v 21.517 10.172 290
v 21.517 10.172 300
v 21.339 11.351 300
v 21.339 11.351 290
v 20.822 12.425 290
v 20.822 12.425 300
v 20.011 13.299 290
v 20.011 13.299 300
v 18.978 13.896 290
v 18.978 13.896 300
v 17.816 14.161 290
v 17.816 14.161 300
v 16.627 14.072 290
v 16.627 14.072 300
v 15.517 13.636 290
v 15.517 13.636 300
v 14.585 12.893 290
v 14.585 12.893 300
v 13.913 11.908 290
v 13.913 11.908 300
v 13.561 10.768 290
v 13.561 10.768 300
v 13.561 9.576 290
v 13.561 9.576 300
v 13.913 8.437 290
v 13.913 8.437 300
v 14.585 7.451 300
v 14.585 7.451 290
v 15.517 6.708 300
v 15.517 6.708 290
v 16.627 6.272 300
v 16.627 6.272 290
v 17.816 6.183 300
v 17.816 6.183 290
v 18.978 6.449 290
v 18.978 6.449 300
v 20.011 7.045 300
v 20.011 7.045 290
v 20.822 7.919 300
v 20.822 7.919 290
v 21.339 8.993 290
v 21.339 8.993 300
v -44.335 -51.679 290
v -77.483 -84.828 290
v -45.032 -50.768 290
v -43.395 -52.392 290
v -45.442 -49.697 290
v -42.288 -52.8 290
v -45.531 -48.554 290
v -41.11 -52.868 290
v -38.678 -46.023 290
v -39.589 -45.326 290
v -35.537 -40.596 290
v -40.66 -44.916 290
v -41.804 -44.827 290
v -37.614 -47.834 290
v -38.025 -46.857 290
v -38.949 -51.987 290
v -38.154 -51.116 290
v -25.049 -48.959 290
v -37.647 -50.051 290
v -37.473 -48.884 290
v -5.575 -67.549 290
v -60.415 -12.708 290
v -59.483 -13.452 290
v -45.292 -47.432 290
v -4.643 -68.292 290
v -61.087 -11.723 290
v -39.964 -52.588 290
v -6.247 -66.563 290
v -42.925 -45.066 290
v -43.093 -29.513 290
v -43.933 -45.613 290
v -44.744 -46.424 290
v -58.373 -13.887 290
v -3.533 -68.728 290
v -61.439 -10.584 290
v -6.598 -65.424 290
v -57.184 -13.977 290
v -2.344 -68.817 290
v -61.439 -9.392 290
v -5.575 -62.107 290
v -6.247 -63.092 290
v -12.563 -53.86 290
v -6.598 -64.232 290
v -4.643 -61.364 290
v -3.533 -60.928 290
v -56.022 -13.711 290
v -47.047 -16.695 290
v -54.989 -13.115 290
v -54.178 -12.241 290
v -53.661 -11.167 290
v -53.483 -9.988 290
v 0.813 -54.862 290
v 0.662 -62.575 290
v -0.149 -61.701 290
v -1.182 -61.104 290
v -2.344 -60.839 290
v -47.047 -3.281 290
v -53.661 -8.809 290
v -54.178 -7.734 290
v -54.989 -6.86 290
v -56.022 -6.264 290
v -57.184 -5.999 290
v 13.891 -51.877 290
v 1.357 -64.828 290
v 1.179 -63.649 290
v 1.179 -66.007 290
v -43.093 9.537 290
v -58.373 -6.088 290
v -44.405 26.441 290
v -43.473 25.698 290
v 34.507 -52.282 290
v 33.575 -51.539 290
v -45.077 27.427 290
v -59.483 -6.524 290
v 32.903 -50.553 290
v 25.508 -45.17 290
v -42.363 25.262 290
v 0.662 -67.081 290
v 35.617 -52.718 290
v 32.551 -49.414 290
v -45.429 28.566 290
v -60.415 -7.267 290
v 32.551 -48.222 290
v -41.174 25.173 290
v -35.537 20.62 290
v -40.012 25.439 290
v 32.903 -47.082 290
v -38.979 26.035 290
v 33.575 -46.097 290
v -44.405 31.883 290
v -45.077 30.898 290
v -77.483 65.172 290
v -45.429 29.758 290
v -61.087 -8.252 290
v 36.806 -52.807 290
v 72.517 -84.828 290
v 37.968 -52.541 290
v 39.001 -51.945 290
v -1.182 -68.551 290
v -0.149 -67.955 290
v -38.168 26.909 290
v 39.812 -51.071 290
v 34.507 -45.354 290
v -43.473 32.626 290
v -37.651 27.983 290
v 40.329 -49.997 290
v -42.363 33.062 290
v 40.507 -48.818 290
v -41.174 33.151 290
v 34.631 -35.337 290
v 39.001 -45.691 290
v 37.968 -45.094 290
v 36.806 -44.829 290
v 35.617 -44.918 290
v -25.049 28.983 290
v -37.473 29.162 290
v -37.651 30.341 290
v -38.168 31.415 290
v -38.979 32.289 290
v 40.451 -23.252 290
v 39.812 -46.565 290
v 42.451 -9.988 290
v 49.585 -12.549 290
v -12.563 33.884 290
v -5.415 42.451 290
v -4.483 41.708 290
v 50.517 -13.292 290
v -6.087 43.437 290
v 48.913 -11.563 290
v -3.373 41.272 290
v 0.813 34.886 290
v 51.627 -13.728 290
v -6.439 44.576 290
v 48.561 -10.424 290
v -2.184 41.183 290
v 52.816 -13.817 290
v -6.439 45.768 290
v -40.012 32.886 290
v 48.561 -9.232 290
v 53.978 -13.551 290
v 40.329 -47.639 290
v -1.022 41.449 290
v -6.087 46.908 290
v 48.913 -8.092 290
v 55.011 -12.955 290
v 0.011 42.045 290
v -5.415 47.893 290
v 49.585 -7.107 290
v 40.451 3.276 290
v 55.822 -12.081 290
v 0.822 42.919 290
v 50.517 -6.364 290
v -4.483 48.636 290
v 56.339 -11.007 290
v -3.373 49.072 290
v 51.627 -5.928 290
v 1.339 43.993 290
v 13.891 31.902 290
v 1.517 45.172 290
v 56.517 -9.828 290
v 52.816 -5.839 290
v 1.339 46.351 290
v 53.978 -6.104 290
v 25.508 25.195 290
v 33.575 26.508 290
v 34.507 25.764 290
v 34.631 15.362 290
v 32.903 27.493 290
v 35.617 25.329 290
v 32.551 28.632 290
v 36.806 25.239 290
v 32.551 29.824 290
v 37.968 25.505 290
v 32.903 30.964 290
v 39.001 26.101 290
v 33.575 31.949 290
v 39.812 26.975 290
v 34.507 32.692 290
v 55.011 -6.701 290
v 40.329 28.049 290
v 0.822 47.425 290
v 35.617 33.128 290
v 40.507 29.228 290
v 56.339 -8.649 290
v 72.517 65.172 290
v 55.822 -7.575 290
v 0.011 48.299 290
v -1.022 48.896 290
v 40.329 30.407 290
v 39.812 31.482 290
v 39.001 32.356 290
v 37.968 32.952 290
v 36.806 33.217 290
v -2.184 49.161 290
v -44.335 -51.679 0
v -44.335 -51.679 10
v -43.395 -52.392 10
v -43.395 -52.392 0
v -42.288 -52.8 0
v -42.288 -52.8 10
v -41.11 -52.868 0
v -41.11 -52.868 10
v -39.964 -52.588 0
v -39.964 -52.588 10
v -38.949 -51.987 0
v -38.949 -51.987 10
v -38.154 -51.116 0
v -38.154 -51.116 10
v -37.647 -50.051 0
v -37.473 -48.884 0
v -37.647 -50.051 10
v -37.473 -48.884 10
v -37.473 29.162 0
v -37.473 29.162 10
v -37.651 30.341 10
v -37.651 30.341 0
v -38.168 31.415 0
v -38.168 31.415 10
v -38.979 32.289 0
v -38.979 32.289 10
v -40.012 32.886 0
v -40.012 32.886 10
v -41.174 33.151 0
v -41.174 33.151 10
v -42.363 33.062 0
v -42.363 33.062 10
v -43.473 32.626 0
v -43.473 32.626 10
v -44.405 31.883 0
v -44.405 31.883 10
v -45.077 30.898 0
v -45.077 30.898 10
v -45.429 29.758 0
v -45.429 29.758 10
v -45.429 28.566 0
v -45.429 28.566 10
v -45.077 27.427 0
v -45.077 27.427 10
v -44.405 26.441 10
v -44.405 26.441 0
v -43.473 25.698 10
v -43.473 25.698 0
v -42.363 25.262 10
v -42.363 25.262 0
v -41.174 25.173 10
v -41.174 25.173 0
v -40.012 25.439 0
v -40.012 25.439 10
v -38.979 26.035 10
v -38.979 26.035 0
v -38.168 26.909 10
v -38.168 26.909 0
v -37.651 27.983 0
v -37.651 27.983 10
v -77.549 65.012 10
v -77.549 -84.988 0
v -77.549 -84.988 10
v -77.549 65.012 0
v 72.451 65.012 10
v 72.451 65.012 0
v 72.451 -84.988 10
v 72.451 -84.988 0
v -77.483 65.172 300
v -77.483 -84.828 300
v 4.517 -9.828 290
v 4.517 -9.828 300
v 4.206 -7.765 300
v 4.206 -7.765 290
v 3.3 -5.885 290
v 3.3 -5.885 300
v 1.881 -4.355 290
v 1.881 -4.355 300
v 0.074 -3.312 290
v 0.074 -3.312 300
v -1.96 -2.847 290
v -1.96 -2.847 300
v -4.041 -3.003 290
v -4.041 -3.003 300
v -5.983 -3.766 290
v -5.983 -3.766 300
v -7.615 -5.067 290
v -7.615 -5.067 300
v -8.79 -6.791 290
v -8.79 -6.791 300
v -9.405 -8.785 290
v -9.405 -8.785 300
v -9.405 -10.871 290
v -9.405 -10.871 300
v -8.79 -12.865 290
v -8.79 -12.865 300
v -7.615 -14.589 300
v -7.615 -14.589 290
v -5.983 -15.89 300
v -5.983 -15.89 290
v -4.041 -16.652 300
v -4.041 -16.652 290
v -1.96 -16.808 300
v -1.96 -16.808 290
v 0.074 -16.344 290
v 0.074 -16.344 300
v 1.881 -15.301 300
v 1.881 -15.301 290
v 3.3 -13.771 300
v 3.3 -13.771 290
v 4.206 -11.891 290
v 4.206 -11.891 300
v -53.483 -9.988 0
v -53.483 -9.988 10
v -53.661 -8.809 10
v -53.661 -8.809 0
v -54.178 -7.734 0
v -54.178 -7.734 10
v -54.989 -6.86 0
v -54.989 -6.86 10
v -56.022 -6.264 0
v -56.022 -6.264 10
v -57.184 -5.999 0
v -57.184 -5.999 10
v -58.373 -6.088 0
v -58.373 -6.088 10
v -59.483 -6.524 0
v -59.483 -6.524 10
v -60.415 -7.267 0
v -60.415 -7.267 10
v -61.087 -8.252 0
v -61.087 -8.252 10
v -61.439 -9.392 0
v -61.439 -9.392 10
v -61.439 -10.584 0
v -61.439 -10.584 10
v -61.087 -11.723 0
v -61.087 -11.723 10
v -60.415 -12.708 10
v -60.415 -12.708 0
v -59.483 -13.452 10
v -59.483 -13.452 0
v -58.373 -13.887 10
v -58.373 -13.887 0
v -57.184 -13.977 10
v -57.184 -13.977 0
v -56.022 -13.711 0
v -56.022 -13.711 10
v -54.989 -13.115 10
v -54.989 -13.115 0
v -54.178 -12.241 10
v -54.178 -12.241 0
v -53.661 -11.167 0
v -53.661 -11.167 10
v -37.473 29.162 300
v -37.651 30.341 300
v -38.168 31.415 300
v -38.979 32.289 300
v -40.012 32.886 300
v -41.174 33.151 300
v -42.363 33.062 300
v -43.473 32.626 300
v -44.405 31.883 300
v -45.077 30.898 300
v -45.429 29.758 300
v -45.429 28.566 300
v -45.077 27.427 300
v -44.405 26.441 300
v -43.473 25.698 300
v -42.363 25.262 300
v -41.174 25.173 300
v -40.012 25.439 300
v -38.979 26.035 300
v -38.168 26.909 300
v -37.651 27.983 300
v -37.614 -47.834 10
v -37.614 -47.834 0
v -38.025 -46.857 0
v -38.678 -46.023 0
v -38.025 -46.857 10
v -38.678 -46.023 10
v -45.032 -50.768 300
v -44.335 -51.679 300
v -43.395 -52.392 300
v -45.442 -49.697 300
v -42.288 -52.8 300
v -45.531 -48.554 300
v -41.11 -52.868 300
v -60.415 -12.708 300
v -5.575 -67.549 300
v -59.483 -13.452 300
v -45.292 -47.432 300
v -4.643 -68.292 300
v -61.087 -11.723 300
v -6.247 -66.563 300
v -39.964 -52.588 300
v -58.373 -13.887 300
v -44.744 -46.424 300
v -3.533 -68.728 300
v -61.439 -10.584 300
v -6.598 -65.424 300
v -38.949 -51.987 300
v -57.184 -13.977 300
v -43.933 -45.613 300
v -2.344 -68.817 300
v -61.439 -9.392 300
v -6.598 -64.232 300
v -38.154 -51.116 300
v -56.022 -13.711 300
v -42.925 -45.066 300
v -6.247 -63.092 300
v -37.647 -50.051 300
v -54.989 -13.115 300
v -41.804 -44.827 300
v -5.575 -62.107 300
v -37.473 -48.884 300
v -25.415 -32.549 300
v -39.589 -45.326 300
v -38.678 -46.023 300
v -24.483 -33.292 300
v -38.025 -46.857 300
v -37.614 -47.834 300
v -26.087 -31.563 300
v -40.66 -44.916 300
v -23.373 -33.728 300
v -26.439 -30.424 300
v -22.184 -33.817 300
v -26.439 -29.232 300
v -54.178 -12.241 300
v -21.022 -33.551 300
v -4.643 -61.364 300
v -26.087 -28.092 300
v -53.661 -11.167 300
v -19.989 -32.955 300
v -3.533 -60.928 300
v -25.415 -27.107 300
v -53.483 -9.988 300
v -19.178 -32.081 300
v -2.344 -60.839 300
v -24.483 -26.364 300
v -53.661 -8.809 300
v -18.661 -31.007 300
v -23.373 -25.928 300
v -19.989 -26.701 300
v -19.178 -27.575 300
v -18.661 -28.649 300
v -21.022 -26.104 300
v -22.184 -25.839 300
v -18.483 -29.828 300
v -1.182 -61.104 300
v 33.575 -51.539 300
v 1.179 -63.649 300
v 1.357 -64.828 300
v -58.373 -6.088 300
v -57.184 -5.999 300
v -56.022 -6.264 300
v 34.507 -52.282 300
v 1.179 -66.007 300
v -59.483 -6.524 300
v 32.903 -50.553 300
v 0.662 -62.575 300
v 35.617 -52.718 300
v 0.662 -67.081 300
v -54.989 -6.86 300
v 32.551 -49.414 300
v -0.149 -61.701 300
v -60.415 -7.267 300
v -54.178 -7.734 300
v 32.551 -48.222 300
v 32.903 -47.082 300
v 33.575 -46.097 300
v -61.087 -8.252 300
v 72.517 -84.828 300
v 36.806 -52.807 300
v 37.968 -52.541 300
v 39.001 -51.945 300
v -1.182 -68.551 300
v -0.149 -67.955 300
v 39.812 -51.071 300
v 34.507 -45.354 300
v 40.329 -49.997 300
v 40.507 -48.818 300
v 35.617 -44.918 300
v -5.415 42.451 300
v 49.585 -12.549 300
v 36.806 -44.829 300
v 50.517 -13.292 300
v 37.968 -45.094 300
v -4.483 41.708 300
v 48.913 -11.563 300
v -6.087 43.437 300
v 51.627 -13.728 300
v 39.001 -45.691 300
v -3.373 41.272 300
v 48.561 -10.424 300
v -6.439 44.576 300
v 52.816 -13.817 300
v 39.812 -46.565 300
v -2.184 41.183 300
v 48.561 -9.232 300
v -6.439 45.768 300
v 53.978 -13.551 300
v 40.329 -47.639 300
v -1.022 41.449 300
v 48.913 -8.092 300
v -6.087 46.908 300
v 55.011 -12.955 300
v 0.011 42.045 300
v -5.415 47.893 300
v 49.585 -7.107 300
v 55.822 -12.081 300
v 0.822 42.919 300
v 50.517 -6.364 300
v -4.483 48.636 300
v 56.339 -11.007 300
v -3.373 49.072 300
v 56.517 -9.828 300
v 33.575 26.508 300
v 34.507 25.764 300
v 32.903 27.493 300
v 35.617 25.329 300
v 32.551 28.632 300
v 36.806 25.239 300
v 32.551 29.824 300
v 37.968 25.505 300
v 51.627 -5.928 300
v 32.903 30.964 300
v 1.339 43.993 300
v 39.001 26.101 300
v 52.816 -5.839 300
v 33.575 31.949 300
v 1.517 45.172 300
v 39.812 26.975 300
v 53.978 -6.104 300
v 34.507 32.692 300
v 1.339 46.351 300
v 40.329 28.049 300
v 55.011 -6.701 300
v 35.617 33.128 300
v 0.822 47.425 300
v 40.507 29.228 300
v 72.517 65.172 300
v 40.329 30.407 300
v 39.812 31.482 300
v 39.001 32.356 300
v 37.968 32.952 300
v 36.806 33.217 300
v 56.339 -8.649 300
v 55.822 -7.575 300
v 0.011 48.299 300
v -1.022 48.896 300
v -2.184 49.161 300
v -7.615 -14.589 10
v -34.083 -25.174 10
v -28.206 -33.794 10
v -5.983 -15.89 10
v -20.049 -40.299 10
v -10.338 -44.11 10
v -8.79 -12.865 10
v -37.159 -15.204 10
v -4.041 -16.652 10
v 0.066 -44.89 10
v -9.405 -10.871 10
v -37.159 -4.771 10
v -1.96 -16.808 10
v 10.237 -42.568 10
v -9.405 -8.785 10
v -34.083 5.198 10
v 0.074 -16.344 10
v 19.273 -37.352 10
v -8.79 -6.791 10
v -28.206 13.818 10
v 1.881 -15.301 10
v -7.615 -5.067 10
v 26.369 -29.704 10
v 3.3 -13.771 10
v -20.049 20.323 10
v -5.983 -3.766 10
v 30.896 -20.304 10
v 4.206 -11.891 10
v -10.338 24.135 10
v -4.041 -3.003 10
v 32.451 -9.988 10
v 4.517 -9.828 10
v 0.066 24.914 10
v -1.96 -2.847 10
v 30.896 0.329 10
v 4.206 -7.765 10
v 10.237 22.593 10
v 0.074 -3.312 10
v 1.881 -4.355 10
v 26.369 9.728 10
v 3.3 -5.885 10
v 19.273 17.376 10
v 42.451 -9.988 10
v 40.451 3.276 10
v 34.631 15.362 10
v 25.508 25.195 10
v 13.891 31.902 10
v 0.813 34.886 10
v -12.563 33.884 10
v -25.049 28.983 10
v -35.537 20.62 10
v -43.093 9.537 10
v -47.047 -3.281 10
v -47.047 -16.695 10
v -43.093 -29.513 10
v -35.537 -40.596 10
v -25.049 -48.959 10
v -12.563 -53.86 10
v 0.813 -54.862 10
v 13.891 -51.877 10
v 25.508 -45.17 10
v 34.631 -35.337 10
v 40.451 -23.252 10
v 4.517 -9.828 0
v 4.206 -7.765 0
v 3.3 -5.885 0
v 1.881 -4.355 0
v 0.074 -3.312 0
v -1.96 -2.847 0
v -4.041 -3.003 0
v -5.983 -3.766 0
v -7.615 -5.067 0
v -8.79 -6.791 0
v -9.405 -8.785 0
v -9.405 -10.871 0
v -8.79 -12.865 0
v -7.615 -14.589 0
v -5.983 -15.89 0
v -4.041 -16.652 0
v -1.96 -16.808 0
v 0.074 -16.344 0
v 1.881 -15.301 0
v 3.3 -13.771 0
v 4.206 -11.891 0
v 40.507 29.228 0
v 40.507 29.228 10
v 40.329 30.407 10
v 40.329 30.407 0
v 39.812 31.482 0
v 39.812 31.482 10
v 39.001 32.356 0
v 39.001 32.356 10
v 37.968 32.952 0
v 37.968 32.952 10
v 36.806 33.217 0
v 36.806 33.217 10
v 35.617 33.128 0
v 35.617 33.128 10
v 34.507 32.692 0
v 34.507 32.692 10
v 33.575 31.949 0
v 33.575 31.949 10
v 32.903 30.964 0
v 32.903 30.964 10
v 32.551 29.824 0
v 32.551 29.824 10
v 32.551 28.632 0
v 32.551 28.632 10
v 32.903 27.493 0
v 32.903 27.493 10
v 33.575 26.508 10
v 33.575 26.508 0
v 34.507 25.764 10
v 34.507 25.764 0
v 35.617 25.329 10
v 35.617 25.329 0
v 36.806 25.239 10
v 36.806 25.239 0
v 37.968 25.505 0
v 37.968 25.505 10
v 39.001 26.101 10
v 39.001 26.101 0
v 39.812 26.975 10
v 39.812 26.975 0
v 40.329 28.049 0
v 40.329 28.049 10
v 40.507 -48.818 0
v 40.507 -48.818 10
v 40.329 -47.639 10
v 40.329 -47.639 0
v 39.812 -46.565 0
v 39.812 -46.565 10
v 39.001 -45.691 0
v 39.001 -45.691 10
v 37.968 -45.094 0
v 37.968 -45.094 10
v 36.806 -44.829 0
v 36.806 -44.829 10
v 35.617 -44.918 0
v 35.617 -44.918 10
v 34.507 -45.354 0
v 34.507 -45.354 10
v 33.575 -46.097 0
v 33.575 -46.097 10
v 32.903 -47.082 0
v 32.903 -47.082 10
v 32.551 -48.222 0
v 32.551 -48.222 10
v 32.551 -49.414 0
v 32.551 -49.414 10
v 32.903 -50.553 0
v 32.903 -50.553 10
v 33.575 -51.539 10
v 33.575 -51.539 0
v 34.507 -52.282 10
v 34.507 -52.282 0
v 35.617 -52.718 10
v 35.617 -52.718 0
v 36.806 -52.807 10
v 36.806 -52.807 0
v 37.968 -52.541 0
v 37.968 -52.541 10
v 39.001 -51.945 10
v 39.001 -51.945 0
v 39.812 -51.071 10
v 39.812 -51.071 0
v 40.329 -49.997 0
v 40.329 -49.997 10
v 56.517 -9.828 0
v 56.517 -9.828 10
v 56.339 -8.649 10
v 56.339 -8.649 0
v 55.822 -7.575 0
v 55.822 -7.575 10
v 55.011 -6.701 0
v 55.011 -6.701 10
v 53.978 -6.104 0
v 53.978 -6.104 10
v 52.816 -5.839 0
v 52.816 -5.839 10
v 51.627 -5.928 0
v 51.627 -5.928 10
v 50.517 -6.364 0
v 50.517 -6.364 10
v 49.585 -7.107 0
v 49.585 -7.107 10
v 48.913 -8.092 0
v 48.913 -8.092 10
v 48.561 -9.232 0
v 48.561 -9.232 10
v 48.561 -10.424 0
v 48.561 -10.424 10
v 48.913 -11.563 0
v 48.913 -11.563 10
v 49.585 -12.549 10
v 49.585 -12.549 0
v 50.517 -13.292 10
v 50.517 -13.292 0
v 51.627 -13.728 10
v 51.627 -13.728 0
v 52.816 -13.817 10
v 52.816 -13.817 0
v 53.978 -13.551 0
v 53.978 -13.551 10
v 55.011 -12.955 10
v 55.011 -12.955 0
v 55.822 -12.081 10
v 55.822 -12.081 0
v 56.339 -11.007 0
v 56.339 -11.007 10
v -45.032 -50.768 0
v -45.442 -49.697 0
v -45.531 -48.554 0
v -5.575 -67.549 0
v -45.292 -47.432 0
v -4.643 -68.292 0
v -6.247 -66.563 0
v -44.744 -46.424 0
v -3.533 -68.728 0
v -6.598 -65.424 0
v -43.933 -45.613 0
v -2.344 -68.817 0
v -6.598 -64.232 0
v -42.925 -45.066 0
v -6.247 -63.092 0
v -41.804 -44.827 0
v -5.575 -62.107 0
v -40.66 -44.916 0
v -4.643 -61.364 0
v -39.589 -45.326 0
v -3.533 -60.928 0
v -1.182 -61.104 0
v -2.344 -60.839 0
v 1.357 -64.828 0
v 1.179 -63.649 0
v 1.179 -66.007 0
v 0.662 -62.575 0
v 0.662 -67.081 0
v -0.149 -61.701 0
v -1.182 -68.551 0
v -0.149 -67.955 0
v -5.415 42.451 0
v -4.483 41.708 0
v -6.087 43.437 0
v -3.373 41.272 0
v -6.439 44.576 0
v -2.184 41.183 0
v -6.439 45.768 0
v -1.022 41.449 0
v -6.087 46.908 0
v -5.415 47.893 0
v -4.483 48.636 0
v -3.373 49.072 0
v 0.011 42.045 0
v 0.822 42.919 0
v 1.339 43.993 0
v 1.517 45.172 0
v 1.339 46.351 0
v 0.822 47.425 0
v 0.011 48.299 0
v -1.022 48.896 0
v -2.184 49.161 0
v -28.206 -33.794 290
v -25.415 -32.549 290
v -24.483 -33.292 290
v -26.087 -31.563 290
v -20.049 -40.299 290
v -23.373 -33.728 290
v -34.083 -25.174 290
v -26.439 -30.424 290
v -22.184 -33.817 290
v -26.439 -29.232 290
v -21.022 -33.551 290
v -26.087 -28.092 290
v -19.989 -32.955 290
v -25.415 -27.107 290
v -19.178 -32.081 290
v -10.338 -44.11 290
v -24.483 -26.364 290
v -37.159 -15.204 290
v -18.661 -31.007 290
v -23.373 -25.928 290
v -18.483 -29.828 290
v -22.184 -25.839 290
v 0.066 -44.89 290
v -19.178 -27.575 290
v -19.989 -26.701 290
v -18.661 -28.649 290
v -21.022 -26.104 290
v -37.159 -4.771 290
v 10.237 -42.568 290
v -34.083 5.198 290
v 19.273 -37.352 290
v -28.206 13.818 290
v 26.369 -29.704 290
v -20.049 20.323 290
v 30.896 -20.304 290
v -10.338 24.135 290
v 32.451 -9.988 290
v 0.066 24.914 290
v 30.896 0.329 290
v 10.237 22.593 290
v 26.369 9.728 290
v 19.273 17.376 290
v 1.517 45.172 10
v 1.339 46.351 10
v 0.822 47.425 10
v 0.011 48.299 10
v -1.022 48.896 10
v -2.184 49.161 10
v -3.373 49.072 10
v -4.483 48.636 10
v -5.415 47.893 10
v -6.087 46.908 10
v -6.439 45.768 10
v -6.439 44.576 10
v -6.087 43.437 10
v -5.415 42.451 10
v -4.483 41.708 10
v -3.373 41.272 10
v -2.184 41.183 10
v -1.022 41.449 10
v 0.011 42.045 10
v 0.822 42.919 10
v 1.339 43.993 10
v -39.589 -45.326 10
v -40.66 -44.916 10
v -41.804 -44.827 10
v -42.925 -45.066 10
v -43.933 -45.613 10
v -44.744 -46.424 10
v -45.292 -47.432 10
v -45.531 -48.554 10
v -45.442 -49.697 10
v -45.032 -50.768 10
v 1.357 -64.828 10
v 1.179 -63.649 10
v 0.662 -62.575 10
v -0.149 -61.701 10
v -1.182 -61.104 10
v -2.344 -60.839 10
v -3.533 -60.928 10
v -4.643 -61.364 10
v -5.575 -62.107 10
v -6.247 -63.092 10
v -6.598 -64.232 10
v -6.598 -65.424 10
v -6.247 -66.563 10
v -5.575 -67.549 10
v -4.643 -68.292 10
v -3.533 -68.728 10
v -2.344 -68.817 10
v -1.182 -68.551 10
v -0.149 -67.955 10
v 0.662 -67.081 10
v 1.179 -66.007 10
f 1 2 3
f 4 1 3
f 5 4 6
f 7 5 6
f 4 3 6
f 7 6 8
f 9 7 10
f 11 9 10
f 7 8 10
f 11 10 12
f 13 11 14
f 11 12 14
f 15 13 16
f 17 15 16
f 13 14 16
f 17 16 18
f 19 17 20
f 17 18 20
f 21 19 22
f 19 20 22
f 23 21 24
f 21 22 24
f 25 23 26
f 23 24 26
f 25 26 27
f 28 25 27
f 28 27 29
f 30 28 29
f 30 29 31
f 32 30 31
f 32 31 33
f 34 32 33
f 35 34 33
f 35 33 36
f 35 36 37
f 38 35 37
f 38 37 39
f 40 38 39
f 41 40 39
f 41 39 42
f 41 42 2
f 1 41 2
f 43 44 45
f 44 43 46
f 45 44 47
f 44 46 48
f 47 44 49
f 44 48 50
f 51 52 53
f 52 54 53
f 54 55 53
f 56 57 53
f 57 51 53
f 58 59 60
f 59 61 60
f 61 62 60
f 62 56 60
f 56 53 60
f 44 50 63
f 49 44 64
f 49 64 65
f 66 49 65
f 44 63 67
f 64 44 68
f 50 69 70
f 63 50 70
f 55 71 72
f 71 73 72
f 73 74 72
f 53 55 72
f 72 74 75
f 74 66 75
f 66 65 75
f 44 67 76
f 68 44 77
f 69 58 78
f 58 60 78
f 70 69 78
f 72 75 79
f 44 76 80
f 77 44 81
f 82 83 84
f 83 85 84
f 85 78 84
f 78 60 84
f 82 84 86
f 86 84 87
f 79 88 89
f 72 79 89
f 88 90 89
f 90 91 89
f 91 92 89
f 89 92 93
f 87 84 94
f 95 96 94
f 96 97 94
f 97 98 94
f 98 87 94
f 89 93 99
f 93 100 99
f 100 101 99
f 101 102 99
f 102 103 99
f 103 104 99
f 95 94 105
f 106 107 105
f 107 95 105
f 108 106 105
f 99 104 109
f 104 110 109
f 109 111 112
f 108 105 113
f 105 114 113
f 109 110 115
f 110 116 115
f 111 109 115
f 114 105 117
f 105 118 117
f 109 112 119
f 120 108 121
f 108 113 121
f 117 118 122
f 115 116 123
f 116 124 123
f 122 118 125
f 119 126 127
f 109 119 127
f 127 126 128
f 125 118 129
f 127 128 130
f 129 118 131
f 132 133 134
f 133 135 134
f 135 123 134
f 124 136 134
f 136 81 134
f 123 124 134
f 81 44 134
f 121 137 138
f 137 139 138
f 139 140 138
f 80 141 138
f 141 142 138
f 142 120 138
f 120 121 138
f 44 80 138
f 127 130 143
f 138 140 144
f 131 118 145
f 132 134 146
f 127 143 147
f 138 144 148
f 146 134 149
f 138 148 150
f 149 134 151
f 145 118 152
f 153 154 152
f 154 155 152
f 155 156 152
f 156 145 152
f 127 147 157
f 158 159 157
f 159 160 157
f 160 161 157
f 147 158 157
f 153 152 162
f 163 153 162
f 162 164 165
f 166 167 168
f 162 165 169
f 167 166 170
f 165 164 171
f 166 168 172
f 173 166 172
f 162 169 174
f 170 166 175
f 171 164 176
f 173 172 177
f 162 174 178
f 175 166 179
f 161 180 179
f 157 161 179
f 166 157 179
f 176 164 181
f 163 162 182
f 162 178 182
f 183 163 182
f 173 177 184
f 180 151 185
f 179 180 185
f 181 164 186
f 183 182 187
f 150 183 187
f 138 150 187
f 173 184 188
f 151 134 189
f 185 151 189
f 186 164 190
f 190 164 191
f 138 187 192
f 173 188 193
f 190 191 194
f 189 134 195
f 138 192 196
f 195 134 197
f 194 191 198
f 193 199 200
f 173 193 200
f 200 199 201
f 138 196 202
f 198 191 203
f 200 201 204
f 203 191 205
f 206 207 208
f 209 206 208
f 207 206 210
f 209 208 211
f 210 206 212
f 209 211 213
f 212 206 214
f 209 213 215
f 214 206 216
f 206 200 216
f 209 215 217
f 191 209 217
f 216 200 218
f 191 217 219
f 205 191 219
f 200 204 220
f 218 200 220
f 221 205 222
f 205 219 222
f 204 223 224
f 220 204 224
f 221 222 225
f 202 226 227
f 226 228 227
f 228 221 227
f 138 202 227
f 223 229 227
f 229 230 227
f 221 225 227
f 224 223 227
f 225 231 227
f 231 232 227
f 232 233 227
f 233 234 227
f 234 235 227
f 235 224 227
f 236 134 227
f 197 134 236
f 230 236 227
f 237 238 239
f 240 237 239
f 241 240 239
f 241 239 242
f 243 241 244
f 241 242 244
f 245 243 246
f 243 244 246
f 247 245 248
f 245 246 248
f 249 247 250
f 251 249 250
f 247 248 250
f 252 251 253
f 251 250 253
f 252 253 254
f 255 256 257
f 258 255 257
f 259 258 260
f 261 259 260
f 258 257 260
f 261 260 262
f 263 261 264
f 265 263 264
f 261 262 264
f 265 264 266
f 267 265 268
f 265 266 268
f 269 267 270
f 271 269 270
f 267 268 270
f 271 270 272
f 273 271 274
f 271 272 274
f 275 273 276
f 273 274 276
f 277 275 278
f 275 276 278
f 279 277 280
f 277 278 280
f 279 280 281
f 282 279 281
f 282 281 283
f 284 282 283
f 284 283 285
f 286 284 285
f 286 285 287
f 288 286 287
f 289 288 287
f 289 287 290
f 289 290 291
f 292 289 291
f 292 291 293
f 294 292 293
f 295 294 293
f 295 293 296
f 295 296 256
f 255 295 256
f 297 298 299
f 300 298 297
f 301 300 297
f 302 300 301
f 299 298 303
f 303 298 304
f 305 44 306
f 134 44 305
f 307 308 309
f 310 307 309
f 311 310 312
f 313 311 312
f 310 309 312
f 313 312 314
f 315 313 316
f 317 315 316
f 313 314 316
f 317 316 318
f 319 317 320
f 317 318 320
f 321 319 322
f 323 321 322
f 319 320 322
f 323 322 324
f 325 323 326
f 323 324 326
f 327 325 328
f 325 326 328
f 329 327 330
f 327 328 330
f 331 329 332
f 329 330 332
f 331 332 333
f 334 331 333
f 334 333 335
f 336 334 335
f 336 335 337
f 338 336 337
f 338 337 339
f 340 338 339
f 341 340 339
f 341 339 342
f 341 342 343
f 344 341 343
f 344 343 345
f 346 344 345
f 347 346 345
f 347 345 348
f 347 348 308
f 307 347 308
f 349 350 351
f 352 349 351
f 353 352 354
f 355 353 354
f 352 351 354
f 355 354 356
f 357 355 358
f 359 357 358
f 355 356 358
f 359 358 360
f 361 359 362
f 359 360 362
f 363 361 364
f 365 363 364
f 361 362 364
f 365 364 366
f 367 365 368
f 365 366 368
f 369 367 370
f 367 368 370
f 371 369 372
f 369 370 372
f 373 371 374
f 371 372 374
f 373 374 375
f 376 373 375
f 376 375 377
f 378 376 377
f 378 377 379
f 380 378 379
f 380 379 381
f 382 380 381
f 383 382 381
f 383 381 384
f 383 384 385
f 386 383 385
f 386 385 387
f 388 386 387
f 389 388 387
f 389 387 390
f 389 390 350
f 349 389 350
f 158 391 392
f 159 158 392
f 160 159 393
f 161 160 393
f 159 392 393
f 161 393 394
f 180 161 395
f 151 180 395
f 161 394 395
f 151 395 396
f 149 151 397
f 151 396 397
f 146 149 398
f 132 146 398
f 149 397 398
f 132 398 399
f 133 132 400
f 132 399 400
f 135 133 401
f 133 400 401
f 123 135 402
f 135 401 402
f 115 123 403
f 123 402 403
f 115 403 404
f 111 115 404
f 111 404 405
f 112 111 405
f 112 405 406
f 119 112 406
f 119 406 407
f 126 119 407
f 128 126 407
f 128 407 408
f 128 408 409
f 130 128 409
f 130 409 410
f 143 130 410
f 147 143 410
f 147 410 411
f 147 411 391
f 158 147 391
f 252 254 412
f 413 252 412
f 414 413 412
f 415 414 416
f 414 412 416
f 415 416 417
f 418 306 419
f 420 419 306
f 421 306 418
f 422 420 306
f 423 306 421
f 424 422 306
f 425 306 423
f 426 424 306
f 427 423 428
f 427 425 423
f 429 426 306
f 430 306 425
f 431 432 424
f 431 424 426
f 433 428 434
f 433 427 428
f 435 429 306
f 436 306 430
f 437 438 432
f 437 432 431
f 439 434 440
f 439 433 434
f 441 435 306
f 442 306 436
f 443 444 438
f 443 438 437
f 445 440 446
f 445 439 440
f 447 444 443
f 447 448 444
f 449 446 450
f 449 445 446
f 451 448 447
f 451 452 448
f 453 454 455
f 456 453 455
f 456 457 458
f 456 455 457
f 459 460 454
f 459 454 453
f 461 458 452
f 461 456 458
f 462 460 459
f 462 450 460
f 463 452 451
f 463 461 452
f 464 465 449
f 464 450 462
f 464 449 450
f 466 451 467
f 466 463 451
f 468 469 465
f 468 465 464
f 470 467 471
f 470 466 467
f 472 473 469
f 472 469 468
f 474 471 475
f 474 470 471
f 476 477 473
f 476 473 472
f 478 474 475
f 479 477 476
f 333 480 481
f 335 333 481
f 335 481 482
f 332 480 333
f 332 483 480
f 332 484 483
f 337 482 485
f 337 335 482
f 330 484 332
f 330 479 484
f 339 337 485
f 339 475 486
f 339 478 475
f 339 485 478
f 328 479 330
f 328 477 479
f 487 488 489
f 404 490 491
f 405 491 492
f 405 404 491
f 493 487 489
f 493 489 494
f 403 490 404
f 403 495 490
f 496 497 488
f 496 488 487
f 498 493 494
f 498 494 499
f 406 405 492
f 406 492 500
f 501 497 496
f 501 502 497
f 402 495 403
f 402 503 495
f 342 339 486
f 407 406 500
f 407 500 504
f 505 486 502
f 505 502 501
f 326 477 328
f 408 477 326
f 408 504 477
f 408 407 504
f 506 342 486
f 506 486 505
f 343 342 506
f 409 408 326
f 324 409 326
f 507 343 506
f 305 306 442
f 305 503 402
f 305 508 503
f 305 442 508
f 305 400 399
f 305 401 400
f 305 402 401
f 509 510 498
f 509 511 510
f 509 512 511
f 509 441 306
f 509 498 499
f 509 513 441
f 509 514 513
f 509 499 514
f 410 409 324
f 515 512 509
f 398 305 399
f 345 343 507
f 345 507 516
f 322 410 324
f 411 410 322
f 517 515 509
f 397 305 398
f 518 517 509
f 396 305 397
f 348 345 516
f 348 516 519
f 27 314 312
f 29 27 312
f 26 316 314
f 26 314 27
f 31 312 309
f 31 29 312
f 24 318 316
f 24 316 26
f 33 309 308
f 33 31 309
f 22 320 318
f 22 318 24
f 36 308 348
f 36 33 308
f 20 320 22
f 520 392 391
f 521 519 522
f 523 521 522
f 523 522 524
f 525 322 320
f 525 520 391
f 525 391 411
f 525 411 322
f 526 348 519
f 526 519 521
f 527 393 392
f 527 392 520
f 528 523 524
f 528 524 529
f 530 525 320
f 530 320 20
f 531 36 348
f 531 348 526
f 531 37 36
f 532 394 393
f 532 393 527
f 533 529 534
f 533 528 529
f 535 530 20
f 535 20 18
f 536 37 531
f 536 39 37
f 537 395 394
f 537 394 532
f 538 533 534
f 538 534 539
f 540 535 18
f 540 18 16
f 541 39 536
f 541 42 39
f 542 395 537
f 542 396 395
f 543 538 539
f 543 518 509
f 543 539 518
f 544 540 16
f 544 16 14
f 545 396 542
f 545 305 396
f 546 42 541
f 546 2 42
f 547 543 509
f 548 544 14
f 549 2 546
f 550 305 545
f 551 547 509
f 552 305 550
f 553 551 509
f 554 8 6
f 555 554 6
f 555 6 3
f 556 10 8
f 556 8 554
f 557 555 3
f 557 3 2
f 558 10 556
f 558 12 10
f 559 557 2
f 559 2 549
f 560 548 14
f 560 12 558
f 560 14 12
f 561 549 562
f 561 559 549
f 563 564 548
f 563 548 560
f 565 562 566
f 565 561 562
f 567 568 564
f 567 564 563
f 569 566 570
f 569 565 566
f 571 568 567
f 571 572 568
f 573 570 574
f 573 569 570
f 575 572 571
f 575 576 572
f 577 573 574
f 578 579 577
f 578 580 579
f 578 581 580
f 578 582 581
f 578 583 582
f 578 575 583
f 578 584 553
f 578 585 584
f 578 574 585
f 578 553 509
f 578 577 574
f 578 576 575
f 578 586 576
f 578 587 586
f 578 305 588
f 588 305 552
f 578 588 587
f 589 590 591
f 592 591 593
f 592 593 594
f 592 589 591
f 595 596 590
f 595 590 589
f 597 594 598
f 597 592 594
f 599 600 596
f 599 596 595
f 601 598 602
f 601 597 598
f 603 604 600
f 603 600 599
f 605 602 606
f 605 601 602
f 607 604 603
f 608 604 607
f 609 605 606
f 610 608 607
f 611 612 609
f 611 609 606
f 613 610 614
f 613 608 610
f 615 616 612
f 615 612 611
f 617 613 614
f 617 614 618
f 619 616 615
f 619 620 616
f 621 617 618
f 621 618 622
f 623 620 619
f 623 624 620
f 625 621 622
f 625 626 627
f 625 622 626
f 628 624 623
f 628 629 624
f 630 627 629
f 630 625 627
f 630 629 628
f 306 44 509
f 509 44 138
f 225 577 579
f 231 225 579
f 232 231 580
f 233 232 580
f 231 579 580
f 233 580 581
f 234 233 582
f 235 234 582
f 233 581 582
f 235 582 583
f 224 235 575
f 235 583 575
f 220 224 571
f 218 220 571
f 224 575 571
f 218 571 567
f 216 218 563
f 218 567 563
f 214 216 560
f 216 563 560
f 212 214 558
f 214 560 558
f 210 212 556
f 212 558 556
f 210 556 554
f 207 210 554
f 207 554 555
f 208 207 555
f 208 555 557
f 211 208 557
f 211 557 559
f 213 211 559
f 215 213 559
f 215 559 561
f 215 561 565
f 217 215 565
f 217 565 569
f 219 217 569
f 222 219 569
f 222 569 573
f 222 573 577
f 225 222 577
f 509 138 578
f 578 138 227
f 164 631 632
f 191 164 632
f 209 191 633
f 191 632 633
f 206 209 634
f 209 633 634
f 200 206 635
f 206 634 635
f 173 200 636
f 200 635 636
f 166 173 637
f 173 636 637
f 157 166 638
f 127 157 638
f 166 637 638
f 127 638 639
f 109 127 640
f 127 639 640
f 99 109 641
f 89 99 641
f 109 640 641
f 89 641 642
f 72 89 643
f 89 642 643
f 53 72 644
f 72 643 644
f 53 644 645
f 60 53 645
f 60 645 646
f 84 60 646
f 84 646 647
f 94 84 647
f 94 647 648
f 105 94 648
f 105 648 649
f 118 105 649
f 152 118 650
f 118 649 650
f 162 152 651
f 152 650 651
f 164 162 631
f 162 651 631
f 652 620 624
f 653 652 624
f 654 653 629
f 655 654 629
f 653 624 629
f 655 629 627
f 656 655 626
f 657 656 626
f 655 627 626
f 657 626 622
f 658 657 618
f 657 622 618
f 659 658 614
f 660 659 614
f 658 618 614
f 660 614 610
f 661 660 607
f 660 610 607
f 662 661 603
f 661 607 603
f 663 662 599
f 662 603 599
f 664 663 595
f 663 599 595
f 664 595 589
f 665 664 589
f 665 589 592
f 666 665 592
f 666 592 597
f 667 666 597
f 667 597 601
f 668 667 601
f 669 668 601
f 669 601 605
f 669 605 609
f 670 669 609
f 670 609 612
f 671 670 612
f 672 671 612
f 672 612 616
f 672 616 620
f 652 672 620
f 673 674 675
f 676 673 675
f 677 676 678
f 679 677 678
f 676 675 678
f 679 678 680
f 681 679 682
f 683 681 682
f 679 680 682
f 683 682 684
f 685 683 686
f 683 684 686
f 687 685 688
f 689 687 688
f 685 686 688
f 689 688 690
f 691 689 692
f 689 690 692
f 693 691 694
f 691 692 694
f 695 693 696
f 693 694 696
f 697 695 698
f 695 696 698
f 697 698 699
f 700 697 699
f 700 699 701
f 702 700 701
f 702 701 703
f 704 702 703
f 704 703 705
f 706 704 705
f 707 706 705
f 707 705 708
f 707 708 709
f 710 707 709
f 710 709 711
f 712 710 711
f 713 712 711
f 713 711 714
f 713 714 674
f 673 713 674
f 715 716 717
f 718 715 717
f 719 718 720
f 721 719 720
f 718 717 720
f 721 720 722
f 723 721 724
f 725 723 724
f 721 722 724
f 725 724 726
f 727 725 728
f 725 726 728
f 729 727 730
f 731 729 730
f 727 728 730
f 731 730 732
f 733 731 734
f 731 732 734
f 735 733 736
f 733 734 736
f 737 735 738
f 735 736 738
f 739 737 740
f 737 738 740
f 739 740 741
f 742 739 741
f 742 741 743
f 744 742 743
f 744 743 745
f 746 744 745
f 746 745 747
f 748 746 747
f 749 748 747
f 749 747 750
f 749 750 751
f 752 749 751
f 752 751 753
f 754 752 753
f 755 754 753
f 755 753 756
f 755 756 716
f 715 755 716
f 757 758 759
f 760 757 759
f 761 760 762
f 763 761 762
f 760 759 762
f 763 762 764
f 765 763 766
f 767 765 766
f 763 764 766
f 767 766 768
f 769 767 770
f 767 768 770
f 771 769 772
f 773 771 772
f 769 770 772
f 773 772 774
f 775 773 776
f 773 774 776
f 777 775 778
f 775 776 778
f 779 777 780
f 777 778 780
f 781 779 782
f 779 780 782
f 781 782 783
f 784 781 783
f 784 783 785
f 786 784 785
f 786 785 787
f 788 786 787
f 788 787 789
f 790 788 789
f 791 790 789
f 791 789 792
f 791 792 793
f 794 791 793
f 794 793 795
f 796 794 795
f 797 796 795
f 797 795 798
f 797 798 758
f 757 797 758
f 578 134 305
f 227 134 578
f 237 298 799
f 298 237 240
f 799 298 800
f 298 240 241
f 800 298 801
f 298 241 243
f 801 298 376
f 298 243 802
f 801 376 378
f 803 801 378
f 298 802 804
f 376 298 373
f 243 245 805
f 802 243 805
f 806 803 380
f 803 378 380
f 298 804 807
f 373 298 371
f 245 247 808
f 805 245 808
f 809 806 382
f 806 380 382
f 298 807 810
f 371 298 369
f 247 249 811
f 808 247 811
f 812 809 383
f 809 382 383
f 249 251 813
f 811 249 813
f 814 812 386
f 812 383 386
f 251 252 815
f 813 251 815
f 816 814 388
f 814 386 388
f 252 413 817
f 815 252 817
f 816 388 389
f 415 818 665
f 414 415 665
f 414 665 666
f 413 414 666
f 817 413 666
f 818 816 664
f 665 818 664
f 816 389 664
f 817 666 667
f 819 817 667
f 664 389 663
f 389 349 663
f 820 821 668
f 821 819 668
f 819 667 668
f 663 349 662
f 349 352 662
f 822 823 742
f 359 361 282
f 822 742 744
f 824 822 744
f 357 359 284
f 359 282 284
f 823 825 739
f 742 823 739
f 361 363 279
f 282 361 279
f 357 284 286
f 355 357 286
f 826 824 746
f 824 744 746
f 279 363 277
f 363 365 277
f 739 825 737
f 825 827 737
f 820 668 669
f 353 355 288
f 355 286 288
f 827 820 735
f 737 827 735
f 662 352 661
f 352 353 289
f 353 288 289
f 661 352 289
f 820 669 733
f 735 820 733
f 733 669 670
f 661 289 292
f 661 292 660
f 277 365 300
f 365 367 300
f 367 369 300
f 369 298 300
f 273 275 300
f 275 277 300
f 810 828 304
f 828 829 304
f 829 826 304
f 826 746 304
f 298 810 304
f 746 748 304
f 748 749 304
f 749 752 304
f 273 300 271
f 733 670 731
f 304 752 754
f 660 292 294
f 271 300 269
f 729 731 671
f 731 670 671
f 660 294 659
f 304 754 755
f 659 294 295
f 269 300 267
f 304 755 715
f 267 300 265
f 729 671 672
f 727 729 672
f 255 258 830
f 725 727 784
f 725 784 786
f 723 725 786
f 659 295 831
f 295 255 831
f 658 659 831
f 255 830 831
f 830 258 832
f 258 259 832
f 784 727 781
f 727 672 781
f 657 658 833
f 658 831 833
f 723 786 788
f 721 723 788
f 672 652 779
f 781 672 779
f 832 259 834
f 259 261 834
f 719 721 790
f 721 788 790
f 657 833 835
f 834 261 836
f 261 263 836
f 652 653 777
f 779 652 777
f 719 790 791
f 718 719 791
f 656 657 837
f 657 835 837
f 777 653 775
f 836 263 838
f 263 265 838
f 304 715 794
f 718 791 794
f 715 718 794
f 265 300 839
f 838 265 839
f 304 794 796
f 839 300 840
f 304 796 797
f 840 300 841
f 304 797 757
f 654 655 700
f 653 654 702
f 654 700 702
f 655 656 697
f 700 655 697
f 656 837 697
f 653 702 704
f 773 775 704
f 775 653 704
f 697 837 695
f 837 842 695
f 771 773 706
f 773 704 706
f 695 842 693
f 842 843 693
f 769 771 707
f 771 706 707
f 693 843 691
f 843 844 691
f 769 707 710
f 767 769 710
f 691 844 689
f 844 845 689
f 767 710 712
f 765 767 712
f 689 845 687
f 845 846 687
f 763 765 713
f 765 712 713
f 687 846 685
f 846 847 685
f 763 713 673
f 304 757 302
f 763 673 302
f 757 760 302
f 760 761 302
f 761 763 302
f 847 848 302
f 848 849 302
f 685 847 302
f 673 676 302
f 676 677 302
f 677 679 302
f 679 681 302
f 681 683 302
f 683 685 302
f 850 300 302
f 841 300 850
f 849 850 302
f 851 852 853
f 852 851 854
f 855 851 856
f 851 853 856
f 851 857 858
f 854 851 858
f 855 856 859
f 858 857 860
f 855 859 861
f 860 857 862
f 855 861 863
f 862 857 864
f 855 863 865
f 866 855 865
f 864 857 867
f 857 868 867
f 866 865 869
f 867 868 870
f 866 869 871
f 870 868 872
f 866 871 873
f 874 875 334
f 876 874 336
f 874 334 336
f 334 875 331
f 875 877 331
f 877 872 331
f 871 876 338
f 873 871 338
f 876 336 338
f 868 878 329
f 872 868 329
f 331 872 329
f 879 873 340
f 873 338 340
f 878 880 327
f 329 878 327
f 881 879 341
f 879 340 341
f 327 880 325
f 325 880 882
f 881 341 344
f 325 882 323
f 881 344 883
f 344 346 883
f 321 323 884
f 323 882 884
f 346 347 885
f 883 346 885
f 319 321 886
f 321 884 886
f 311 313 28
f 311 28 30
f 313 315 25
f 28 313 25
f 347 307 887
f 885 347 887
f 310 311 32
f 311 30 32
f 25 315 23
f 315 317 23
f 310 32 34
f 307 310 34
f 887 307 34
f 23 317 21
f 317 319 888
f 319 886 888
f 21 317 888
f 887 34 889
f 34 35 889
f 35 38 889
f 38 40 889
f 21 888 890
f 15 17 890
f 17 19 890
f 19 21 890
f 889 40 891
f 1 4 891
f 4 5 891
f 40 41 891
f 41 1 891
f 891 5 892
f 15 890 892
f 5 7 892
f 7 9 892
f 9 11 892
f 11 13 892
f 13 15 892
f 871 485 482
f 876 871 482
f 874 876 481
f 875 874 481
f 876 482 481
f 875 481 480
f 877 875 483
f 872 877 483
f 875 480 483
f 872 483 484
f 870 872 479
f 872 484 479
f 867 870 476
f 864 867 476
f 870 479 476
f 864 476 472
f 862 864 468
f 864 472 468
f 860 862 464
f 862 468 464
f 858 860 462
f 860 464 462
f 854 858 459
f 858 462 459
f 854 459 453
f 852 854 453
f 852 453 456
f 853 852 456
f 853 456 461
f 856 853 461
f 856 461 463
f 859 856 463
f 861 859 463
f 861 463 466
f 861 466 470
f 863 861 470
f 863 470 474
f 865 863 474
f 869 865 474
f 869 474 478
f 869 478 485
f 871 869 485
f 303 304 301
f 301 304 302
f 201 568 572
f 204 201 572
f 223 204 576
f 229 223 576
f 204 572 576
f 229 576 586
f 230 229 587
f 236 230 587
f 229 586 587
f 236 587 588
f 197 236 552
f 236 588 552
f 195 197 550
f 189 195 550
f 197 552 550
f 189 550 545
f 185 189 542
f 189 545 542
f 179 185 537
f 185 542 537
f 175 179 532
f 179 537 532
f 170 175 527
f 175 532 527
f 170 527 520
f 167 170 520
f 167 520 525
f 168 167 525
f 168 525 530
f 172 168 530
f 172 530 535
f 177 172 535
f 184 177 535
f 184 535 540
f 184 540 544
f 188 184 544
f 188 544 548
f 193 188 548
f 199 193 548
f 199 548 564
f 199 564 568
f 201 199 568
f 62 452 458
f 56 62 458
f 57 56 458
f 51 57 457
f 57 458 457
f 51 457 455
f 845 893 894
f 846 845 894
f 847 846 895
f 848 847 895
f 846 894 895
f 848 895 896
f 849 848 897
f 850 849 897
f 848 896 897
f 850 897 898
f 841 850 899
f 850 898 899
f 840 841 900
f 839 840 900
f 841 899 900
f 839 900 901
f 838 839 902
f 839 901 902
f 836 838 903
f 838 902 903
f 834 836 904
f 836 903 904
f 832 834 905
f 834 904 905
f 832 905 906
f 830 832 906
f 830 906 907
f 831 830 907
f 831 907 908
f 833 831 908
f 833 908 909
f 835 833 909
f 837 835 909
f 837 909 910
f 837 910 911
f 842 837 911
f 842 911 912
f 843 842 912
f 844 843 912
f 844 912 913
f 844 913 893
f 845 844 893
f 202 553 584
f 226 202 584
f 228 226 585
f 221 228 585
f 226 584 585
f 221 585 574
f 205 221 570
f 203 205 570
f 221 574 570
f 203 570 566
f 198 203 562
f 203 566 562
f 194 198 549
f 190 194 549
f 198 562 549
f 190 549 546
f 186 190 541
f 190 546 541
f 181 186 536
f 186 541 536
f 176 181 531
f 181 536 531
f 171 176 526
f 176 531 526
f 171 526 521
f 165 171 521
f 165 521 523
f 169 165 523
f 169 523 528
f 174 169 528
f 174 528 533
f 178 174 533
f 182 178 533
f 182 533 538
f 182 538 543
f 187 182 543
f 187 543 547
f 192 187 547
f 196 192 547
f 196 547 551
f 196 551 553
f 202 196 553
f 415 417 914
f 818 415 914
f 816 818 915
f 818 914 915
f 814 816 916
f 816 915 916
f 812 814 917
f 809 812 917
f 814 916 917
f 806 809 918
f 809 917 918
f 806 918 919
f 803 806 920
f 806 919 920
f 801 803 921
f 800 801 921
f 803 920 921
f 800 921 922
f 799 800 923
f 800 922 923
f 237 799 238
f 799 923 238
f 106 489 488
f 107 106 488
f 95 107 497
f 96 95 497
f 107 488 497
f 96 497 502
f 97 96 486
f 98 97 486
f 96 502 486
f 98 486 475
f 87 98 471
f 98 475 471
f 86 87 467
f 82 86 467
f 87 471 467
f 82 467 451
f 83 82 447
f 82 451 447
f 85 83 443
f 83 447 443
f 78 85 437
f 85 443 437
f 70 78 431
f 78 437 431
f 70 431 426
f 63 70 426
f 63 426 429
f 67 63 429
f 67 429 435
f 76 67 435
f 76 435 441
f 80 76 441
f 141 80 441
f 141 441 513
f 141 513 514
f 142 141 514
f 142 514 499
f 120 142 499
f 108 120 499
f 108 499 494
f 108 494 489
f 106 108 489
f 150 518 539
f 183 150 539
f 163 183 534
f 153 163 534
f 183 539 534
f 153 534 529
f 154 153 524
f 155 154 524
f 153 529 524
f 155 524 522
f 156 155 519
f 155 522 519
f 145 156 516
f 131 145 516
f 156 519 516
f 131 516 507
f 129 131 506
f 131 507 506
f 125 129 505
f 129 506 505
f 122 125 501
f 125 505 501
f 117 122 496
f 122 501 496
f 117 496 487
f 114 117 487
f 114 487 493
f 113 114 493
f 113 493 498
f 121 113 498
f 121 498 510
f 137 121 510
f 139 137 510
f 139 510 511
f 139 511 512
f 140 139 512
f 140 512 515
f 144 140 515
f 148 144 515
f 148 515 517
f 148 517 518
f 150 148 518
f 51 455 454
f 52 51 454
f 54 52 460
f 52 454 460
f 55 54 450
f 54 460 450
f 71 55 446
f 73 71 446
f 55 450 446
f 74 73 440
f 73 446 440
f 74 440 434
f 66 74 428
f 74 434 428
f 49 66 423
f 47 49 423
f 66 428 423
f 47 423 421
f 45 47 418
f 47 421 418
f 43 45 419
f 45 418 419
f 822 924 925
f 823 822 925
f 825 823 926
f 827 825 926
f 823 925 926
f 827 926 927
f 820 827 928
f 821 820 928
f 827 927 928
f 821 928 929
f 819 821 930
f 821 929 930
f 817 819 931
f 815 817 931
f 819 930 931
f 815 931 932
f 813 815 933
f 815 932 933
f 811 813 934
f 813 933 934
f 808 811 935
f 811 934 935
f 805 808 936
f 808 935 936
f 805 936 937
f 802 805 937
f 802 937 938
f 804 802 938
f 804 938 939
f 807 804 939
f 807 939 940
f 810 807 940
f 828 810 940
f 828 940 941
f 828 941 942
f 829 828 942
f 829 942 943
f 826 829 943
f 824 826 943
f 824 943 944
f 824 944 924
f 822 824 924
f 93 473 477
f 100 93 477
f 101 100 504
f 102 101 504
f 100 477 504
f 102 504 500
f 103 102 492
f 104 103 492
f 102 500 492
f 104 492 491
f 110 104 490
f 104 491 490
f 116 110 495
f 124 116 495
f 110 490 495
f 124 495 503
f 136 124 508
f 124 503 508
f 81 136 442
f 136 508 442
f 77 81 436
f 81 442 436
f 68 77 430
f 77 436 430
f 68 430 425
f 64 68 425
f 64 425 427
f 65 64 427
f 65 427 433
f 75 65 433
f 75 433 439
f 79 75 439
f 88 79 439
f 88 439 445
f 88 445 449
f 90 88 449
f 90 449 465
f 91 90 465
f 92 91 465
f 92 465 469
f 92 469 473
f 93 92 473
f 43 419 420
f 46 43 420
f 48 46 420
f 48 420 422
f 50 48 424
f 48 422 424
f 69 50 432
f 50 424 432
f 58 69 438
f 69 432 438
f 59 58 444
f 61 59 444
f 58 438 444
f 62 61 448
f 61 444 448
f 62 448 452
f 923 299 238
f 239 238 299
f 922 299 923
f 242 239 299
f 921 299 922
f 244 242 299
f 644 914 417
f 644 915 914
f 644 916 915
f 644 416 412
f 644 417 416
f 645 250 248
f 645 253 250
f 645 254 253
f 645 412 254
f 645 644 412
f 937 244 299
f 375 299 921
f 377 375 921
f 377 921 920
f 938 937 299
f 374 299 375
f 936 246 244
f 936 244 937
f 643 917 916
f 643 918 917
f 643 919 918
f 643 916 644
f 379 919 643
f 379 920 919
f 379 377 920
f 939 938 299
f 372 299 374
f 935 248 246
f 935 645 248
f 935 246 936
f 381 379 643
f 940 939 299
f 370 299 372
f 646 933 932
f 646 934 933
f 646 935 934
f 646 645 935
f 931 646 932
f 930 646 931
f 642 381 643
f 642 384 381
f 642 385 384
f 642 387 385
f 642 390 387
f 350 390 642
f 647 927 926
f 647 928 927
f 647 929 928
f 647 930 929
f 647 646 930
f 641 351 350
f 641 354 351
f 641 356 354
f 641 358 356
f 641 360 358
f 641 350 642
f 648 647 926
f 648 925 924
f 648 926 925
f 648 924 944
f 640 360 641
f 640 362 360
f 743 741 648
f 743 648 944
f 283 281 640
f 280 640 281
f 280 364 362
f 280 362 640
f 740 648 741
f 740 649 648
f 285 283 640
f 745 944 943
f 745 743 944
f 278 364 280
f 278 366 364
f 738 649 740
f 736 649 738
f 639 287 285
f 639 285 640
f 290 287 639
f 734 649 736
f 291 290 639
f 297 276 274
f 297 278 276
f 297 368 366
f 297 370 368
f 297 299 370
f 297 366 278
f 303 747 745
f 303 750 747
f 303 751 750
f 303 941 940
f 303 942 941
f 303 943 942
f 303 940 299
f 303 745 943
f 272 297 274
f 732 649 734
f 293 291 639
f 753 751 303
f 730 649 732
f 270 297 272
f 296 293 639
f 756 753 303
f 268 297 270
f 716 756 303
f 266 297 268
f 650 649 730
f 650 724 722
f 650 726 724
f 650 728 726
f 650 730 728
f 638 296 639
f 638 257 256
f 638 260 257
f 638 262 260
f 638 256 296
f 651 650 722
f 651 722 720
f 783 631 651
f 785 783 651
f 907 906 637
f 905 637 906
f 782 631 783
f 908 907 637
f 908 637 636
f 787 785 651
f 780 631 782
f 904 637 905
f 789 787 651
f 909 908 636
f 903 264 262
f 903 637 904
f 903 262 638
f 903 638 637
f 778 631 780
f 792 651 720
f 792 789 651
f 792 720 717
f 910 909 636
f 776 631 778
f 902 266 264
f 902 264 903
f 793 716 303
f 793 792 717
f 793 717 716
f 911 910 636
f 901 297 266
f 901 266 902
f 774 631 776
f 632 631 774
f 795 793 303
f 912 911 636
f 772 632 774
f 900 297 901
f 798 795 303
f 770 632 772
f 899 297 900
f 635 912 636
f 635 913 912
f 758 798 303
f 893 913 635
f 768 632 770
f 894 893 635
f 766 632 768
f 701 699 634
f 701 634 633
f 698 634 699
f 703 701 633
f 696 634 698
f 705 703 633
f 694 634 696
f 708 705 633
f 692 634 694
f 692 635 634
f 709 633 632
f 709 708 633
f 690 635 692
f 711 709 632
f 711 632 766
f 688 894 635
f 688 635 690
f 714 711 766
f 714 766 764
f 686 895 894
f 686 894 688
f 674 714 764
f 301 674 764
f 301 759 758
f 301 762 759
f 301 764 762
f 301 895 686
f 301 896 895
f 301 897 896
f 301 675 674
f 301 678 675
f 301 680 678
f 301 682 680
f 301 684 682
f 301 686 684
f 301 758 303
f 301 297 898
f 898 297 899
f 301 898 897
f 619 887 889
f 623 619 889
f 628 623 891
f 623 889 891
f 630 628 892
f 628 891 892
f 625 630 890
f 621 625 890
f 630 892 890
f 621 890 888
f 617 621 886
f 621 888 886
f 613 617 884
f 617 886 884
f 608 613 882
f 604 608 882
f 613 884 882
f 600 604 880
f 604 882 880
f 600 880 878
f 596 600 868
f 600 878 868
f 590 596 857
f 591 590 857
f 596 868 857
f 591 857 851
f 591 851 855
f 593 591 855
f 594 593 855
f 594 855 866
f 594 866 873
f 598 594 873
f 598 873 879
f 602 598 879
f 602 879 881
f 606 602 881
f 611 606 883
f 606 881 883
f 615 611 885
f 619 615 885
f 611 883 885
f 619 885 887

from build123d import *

# Parameters (mm, degrees)
F0_W      = 150
F0_H      = 150
F1_DEPTH  = 10
F2_R      = 45
F3_DEPTH  = 280
F4_R      = 35
F5_DEPTH  = 280
F6_W      = 150
F6_H      = 150
F7_DEPTH  = 10
F8_R      = 7
F9_DEPTH  = 300.001
F10_R     = 4
F11_DEPTH = 25
F12_R     = 4
F13_DEPTH = 300.001


with BuildPart() as f1:
    # F0 (on Top) → F1 (new body)
    with BuildSketch(Plane.XY):
        with Locations((-2.5494610891, -9.9877563774)):
            Rectangle(F0_W, F0_H)
    extrude(amount=F1_DEPTH)

    # F2 (on face) → F3 (join)
    with BuildSketch(Plane.XY.offset(10)):
        with Locations((-2.5494610891, -9.9877563774)):
            Circle(F2_R)
    extrude(amount=F3_DEPTH)

    # F4 (on face) → F5 (cut)
    with BuildSketch(Plane.XY.offset(290)):
        with Locations((-2.5494610891, -9.9877563774)):
            Circle(F4_R)
    extrude(amount=-F5_DEPTH, mode=Mode.SUBTRACT)

    # F6 (on face) → F7 (join)
    with BuildSketch(Plane.XY.offset(290)):
        with Locations((-2.4832710624, -9.8278763674)):
            Rectangle(F6_W, F6_H)
    extrude(amount=F7_DEPTH)

    # F8 (on face) → F9 (cut, through all)
    with BuildSketch(Plane.XY.offset(300)):
        with Locations((-2.4832710624, -9.8278763674)):
            Circle(F8_R)
    extrude(amount=-F9_DEPTH, mode=Mode.SUBTRACT)

    # F10 (on face) → F11 (cut)
    with BuildSketch(Plane.XY.offset(300)):
        with Locations((-22.4832710624, -29.8278763674)):
            Circle(F10_R)
        with Locations((17.5167289376, 10.1721236326)):
            Circle(F10_R)
    extrude(amount=-F11_DEPTH, mode=Mode.SUBTRACT)

    # F12 (on face) → F13 (cut, through all)
    with BuildSketch(Plane.XY.offset(300)):
        with Locations((-2.4832710624, 45.1721236326)):
            Circle(F12_R)
        with Locations((-41.4732710624, 29.1621236326)):
            Circle(F12_R)
        with Locations((-57.4832710624, -9.9877563774)):
            Circle(F12_R)
        with BuildLine():
            ThreePointArc((-44.3345995739, -51.6792048789), (-39.9871328279, -52.5043756512), (-37.5394610891, -48.8178763674))
            ThreePointArc((-37.5394610891, -48.8178763674), (-37.8350506066, -47.3087895651), (-38.6781325776, -46.0227378826))
            ThreePointArc((-38.6781325776, -46.0227378826), (-44.3016981871, -46.0556392694), (-44.3345995739, -51.6792048789))
        make_face()
        with BuildLine():
            ThreePointArc((-38.6781325776, -46.0227378826), (-37.8350506066, -47.3087895651), (-37.5394610891, -48.8178763674))
            ThreePointArc((-37.5394610891, -48.8178763674), (-39.9871328279, -52.5043756512), (-44.3345995739, -51.6792048789))
            ThreePointArc((-44.3345995739, -51.6792048789), (-39.96418426, -52.5884768766), (-37.4732710624, -48.8840663941))
            ThreePointArc((-37.4732710624, -48.8840663941), (-37.7867717786, -47.331738133), (-38.6781325776, -46.0227378826))
        make_face()
        with BuildLine():
            ThreePointArc((-44.3345995739, -51.6792048789), (-44.3016981871, -46.0556392694), (-38.6781325776, -46.0227378826))
            ThreePointArc((-38.6781325776, -46.0227378826), (-44.3678882138, -45.9894492427), (-44.3345995739, -51.6792048789))
        make_face()
        with Locations((52.5167289376, -9.8278763674)):
            Circle(F12_R)
        with Locations((36.5067289376, -48.8178763674)):
            Circle(F12_R)
        with Locations((-2.6431510724, -64.8278763674)):
            Circle(F12_R)
        with Locations((36.5067289376, 29.2283136593)):
            Circle(F12_R)
    extrude(amount=-F13_DEPTH, mode=Mode.SUBTRACT)


solid = f1.part
